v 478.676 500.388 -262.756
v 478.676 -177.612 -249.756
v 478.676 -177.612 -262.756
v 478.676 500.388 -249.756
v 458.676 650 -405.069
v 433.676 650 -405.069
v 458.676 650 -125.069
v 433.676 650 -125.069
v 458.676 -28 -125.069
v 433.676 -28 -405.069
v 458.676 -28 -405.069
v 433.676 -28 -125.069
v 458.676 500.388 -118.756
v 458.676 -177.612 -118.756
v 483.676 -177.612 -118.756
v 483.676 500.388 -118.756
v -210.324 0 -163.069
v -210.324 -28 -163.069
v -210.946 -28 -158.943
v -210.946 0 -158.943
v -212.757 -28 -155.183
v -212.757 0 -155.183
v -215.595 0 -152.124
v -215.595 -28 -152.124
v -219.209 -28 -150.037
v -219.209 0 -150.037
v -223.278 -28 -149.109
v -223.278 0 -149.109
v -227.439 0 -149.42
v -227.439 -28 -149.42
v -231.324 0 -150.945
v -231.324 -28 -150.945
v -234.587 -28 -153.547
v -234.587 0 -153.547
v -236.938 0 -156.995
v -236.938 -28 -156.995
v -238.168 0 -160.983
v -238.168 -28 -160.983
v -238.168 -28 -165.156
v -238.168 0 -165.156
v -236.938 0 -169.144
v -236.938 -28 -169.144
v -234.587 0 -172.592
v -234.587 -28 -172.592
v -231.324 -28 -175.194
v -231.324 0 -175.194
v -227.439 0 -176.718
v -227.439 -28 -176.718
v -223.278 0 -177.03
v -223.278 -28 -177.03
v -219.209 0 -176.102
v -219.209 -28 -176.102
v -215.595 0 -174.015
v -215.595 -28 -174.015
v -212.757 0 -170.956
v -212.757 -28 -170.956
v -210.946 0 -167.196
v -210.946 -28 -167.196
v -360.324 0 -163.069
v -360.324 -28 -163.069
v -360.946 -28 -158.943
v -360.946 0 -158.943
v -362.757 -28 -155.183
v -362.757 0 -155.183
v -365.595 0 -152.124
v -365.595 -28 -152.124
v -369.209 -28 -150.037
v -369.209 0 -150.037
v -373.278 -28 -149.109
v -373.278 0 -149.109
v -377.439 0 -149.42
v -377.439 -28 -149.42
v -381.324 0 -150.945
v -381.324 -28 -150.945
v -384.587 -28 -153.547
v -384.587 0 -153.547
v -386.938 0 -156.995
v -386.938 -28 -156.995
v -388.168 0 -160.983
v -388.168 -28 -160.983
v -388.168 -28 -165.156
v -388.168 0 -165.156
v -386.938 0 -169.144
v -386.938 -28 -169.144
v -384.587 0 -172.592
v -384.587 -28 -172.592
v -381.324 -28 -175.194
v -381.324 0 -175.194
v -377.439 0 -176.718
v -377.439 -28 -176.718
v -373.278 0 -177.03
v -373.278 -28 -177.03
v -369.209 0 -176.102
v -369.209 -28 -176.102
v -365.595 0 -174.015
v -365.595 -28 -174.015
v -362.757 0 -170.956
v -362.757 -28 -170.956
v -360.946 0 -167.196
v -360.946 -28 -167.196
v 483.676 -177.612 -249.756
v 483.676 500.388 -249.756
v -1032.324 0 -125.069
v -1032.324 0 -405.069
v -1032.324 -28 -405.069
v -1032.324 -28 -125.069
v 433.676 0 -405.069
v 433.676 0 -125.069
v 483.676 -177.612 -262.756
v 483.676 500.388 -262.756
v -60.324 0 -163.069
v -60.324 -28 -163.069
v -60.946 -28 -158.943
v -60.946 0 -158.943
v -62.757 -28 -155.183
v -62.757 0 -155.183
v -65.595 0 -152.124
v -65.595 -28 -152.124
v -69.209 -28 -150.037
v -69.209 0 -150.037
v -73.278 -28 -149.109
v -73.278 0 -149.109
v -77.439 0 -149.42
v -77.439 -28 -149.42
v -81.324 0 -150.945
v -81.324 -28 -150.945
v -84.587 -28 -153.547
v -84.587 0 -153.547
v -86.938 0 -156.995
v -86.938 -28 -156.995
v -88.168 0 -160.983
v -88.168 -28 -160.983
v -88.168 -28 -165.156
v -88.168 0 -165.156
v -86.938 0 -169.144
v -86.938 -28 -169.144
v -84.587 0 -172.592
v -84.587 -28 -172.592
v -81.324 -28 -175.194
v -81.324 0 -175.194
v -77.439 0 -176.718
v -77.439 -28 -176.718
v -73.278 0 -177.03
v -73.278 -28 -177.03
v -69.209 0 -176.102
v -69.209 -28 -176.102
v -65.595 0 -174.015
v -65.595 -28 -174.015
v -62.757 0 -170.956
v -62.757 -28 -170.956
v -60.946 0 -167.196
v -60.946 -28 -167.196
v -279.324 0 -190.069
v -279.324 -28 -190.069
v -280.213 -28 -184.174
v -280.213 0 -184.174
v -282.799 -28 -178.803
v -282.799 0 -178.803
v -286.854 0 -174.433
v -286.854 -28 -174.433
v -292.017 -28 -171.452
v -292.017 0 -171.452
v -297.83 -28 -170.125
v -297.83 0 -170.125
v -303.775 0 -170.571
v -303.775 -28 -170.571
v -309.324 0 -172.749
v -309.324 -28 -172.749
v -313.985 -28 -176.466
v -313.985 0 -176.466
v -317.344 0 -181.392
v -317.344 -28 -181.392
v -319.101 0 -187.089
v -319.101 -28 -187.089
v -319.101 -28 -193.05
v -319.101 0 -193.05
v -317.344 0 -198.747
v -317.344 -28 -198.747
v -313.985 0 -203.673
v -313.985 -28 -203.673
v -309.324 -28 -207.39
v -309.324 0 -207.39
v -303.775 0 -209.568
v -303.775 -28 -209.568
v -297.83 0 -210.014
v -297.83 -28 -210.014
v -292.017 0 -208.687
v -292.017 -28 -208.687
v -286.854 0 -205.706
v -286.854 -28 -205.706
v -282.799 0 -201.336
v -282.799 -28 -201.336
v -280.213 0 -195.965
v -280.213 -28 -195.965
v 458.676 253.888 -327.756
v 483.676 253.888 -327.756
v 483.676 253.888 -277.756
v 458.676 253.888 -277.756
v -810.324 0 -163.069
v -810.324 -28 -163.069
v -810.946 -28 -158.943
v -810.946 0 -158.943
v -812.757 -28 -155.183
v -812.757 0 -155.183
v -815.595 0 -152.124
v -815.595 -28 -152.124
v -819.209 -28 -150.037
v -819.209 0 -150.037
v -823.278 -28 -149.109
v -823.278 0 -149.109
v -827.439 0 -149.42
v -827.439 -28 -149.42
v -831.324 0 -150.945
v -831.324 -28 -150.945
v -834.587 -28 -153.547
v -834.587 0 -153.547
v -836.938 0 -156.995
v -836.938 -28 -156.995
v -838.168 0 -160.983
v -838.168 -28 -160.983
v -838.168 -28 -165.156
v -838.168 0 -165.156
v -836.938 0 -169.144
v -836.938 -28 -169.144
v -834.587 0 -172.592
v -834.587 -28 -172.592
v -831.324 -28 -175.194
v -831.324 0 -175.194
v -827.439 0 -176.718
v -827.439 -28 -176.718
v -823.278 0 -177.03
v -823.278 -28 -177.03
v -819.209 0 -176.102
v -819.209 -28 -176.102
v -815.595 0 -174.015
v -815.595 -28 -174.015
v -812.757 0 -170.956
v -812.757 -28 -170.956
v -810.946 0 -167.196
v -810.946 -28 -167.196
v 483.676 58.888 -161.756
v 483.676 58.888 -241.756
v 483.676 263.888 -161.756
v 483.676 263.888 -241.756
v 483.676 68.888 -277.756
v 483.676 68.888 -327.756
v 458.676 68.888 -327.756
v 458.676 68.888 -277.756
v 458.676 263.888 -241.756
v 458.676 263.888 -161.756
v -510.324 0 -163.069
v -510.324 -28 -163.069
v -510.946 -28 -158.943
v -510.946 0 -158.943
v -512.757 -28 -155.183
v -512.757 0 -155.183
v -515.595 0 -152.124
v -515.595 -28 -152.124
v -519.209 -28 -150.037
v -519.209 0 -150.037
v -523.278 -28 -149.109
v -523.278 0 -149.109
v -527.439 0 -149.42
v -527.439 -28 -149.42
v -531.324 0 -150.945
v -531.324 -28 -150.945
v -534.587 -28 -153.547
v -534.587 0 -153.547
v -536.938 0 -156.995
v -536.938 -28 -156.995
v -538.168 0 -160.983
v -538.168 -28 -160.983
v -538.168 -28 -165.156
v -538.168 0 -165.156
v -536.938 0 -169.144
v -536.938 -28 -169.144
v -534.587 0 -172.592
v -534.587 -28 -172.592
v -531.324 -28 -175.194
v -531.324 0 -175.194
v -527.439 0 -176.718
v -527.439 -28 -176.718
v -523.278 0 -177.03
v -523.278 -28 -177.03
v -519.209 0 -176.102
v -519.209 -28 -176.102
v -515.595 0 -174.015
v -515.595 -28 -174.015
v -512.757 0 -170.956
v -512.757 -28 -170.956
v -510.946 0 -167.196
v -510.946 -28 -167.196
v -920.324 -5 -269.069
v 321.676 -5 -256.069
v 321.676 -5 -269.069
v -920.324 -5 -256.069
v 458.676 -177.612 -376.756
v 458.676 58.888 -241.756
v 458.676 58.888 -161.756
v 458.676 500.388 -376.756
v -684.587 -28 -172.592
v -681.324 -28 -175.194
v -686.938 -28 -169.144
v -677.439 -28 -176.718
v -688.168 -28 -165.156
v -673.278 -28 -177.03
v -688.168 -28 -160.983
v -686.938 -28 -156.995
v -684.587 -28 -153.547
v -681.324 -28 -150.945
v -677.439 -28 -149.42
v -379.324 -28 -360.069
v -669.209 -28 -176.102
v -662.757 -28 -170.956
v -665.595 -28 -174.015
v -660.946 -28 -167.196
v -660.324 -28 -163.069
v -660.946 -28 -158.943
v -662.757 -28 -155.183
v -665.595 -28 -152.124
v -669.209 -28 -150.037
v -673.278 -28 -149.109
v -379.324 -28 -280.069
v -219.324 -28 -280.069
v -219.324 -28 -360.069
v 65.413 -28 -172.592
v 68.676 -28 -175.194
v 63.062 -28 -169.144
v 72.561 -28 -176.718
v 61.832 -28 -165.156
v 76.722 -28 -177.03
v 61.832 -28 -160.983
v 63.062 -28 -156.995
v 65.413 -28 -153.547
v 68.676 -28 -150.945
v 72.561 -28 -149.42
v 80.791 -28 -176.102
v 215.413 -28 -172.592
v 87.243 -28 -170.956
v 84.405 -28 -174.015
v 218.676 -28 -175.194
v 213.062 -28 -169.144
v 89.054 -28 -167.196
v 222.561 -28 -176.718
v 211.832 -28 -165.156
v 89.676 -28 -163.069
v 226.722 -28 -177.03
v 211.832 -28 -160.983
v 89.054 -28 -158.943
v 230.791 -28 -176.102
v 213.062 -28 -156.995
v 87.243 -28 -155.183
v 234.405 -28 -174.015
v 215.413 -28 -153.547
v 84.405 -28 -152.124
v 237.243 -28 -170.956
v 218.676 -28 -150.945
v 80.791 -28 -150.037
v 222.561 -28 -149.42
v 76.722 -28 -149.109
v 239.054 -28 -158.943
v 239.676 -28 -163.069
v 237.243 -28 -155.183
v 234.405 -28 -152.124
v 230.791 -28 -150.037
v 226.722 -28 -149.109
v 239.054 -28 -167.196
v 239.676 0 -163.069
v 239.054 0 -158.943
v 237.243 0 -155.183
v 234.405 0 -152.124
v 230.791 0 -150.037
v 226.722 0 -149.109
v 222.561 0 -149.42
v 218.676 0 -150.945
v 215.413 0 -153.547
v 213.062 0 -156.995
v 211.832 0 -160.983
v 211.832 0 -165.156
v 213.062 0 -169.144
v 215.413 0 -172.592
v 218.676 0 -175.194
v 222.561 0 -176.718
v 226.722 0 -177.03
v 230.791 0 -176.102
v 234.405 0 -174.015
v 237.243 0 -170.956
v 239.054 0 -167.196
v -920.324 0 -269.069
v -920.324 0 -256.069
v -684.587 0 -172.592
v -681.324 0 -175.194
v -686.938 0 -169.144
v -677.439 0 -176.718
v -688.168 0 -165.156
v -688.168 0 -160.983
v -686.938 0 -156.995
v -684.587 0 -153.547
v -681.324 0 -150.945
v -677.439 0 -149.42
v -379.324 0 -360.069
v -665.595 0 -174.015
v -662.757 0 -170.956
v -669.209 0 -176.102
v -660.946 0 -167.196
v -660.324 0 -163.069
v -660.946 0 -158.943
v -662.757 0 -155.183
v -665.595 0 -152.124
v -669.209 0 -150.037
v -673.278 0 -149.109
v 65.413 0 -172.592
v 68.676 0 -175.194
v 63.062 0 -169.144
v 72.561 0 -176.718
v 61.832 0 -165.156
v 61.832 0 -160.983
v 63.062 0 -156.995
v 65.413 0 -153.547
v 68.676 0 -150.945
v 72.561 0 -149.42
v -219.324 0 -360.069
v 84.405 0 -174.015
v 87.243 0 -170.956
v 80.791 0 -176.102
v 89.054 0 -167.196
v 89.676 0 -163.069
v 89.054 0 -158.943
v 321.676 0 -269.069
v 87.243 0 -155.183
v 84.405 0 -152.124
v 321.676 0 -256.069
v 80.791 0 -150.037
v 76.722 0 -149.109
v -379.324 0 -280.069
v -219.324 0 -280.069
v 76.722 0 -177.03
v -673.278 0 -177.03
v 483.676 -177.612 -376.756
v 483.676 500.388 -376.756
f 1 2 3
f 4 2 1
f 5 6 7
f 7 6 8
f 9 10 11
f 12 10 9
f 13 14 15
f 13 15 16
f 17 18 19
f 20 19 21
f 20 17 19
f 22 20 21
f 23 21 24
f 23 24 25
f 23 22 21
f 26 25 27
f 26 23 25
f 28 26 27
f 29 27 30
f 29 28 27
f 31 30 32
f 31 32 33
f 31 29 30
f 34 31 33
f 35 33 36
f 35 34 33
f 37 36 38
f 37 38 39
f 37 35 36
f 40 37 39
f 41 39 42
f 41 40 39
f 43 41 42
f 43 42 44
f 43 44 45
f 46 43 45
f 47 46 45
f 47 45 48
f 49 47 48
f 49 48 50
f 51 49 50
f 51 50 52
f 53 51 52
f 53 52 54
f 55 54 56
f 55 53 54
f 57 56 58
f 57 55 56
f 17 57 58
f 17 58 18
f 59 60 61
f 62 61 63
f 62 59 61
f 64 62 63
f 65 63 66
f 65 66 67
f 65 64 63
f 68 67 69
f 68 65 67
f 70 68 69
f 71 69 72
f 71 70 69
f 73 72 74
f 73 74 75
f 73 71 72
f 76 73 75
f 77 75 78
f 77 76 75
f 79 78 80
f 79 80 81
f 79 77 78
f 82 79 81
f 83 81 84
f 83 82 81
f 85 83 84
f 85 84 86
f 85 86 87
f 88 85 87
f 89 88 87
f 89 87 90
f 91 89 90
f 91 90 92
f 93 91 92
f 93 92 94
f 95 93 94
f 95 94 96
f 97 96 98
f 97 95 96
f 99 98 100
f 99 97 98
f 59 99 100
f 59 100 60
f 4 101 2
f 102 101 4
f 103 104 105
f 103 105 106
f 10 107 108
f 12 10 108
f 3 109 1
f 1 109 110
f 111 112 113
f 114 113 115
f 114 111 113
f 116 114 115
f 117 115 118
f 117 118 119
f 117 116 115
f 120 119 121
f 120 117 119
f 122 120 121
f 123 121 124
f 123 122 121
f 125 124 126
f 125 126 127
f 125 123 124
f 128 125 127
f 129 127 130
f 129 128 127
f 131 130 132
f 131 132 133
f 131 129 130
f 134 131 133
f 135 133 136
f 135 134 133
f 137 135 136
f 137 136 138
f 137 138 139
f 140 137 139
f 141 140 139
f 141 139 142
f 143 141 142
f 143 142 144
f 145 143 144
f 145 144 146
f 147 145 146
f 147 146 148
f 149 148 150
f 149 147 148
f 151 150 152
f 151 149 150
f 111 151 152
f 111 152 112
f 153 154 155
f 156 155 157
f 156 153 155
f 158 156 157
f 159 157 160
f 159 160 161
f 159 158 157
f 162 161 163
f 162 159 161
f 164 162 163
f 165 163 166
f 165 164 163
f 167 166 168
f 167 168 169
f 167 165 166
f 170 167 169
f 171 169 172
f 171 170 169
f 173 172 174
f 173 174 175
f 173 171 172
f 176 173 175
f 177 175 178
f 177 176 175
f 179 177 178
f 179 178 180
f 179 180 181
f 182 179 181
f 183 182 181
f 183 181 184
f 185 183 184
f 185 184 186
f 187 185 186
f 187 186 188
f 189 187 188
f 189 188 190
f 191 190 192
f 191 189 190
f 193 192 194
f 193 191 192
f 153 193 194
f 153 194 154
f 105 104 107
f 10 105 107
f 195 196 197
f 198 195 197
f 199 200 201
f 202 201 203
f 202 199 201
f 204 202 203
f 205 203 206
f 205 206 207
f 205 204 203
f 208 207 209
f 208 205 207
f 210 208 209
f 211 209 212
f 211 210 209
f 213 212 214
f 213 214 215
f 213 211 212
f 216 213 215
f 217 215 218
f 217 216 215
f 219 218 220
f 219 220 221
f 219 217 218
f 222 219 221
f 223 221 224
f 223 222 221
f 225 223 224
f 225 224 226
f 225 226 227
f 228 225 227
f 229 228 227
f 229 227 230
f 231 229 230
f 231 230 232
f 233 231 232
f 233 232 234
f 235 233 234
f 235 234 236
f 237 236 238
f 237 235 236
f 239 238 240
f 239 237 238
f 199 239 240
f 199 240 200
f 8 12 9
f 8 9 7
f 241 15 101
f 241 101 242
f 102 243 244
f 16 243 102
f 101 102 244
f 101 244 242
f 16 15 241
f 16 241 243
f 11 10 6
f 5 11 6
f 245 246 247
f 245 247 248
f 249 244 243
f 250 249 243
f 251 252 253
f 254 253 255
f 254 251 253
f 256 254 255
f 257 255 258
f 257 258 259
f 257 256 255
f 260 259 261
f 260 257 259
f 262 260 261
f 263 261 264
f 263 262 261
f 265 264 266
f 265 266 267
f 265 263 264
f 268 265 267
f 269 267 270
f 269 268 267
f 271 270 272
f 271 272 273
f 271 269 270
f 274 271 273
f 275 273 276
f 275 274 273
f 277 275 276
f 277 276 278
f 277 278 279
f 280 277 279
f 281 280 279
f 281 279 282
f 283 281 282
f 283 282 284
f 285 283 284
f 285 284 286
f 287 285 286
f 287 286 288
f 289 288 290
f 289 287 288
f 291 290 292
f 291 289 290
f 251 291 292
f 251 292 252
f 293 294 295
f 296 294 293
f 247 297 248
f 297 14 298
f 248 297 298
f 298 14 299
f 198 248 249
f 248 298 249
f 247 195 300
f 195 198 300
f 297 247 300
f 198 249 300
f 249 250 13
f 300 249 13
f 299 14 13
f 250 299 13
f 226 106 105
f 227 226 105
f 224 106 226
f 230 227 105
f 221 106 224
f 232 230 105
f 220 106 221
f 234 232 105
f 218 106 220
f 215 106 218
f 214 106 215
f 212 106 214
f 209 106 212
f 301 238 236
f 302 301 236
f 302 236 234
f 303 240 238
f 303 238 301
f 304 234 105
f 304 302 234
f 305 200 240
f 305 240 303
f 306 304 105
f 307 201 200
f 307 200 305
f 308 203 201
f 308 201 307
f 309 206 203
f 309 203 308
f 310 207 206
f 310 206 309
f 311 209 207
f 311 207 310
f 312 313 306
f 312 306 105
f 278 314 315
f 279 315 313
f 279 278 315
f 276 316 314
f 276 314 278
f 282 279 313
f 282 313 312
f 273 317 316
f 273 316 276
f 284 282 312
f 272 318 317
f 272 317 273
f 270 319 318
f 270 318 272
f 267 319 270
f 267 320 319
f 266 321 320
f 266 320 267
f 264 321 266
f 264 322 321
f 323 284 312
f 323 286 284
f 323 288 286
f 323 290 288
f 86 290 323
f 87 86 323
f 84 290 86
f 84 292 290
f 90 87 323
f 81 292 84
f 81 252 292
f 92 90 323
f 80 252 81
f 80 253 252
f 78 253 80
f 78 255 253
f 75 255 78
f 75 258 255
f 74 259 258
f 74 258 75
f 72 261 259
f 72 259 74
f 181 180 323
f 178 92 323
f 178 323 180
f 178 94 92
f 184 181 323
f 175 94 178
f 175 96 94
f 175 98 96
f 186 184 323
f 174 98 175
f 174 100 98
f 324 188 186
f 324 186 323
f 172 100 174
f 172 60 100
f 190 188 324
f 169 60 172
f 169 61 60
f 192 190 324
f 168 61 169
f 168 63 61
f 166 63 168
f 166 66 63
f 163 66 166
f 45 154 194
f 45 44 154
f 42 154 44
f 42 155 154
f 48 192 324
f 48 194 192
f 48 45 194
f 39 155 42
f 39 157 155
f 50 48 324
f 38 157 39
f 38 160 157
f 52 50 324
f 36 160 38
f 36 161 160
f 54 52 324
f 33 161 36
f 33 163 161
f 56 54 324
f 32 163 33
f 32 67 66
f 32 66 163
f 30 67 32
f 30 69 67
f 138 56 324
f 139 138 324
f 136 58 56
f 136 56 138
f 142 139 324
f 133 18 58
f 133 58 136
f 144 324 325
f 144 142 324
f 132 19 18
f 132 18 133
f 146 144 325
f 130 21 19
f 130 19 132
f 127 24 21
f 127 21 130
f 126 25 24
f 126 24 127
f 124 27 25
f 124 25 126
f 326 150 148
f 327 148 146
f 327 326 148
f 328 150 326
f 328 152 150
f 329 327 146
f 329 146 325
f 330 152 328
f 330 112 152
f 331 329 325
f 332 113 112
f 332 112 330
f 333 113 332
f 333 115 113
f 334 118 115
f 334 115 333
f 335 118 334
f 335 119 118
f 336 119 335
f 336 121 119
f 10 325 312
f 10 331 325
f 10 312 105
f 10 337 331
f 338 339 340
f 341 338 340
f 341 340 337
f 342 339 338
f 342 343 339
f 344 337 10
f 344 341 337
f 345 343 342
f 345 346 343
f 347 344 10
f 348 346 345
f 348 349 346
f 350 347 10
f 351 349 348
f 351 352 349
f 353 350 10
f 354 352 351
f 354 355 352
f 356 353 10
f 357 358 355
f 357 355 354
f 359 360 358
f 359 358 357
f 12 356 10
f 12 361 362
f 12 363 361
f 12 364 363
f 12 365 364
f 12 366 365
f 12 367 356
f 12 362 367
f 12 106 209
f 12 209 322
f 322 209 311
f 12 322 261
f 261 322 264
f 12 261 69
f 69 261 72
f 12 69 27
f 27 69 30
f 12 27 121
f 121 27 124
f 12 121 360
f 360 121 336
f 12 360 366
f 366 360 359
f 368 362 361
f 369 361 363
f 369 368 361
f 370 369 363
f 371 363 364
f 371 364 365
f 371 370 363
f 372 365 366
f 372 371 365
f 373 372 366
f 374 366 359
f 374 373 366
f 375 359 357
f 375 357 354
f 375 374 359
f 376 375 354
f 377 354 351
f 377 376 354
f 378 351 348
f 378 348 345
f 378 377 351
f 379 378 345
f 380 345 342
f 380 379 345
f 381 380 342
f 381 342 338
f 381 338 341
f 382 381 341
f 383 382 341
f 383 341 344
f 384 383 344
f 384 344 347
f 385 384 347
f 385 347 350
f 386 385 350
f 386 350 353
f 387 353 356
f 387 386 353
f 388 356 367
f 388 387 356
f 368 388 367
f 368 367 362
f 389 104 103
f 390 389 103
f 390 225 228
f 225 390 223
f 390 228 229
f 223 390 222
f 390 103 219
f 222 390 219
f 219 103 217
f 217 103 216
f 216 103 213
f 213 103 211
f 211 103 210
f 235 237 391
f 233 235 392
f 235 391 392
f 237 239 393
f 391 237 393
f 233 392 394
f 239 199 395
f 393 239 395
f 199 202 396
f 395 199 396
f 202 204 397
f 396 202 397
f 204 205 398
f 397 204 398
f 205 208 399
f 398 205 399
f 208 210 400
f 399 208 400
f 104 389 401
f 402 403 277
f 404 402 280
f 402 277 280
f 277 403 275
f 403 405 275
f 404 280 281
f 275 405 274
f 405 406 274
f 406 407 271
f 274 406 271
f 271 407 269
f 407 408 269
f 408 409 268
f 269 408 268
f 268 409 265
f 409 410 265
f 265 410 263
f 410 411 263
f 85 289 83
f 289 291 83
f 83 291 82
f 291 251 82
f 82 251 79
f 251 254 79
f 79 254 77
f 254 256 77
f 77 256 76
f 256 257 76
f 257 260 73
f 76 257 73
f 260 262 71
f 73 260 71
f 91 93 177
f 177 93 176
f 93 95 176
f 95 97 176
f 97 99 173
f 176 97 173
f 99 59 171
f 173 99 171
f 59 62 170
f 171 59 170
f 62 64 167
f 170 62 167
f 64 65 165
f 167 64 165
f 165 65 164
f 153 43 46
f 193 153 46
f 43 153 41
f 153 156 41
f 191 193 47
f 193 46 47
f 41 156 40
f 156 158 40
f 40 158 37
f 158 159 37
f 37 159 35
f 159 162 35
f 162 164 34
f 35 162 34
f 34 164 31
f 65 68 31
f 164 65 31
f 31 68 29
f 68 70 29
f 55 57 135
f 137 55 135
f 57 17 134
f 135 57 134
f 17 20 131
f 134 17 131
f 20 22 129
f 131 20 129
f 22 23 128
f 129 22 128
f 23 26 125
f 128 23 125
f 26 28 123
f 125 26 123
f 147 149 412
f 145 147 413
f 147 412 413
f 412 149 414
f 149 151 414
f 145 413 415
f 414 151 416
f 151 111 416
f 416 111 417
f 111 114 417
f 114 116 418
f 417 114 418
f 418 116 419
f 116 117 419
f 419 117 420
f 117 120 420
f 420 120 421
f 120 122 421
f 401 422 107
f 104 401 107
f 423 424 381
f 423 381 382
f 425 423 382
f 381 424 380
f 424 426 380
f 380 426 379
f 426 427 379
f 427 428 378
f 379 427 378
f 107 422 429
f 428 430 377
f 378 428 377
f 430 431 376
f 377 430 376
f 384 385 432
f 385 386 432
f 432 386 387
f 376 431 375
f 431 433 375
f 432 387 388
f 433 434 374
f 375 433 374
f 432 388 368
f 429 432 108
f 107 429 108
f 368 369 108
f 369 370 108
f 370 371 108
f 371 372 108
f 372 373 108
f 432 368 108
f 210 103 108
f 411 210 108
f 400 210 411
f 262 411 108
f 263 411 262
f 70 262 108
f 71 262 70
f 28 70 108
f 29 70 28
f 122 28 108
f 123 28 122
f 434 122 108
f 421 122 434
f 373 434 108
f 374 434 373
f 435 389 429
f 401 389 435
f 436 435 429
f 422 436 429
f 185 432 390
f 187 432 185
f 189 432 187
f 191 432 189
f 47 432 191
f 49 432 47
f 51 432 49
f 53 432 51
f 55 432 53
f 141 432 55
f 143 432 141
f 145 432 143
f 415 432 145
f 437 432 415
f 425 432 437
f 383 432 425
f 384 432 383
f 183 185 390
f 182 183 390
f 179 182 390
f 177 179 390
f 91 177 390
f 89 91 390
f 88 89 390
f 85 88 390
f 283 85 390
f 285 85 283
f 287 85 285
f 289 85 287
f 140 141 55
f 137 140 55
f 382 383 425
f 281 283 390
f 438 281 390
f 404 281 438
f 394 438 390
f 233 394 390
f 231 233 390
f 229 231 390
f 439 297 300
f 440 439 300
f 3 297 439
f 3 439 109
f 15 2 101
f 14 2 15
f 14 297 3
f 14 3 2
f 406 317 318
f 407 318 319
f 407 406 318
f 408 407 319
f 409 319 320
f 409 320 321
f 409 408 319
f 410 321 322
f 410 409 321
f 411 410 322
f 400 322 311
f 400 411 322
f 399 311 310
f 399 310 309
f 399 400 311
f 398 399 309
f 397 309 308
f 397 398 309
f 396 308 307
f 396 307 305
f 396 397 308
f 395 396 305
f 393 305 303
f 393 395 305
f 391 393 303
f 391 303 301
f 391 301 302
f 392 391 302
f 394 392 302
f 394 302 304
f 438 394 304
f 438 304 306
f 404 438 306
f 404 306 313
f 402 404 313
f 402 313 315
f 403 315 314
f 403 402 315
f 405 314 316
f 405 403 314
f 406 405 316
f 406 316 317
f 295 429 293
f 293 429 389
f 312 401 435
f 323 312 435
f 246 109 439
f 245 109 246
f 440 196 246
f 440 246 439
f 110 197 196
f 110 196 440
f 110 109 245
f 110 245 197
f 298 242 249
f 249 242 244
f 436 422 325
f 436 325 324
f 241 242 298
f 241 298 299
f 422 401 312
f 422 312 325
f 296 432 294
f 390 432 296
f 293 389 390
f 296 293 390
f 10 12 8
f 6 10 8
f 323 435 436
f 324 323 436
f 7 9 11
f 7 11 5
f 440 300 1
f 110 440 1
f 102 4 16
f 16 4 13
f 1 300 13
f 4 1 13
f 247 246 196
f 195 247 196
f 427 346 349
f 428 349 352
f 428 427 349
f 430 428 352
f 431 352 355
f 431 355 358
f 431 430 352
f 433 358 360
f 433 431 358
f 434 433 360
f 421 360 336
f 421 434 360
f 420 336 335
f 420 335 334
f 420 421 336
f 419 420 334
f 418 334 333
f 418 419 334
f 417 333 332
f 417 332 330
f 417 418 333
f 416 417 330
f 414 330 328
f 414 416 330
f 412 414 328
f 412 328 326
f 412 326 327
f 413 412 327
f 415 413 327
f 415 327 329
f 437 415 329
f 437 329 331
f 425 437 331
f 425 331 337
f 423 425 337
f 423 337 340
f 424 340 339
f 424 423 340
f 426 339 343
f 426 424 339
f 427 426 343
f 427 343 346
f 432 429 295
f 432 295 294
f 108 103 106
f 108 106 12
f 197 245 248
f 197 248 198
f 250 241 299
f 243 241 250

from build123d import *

# Parameters (mm, degrees)
F0_W      = 1466
F0_H      = 280
F0_W_2    = 160
F0_H_2    = 80
F0_R      = 14
F0_R_2    = 20
F1_DEPTH  = 28
F2_W      = 678
F2_H      = 280
F3_DEPTH  = 25
F4_W      = 1242
F4_H      = 13
F5_DEPTH  = 5
F6_W      = 678
F6_H      = 258
F7_DEPTH  = 25
F8_W      = 205
F8_H      = 80
F8_W_2    = 185
F8_H_2    = 50
F9_DEPTH  = 25
F10_W     = 678
F10_H     = 13
F11_DEPTH = 5


with BuildPart() as f1:
    # F0 (on Front) → F1 (new body)
    with BuildSketch(Plane.XZ):
        with Locations((-299.3241530657, -265.0694537163)):
            Rectangle(F0_W, F0_H)
        with Locations((-299.3241530657, -320.0694537163)):
            Rectangle(F0_W_2, F0_H_2, mode=Mode.SUBTRACT)
        with Locations((-824.3241530657, -163.0694537163)):
            Circle(F0_R, mode=Mode.SUBTRACT)
        with Locations((-674.3241530657, -163.0694537163)):
            Circle(F0_R, mode=Mode.SUBTRACT)
        with Locations((-524.3241530657, -163.0694537163)):
            Circle(F0_R, mode=Mode.SUBTRACT)
        with Locations((-374.3241530657, -163.0694537163)):
            Circle(F0_R, mode=Mode.SUBTRACT)
        with Locations((-299.3241530657, -190.0694537163)):
            Circle(F0_R_2, mode=Mode.SUBTRACT)
        with Locations((-224.3241530657, -163.0694537163)):
            Circle(F0_R, mode=Mode.SUBTRACT)
        with Locations((-74.3241530657, -163.0694537163)):
            Circle(F0_R, mode=Mode.SUBTRACT)
        with Locations((75.6758469343, -163.0694537163)):
            Circle(F0_R, mode=Mode.SUBTRACT)
        with Locations((225.6758469343, -163.0694537163)):
            Circle(F0_R, mode=Mode.SUBTRACT)
    extrude(amount=F1_DEPTH)

    # F4 (on face) → F5 (cut)
    with BuildSketch(Plane(origin=(0, 0, 0), x_dir=(-1, 0, 0), z_dir=(0, 1, 0))):
        with Locations((299.3241530657, -262.5694537163)):
            Rectangle(F4_W, F4_H)
    extrude(amount=-F5_DEPTH, mode=Mode.SUBTRACT)


with BuildPart() as f3:
    # F2 (on face) → F3 (new body)
    with BuildSketch(Plane.YZ.offset(433.6758469343)):
        with Locations((311, -265.0694537163)):
            Rectangle(F2_W, F2_H)
    extrude(amount=F3_DEPTH)


with BuildPart() as f7:
    # F6 (on face) → F7 (new body)
    with BuildSketch(Plane.YZ.offset(458.6758469343)):
        with Locations((161.3877224861, -247.7558404207)):
            Rectangle(F6_W, F6_H)
    extrude(amount=F7_DEPTH)

    # F8 (on face) → F9 (cut, through all)
    with BuildSketch(Plane.YZ.offset(483.6758469343)):
        with Locations((161.3877224861, -201.7558404207)):
            Rectangle(F8_W, F8_H)
        with Locations((161.3877224861, -302.7558404207)):
            Rectangle(F8_W_2, F8_H_2)
    extrude(amount=-F9_DEPTH, mode=Mode.SUBTRACT)

    # F10 (on face) → F11 (cut)
    with BuildSketch(Plane.YZ.offset(483.6758469343)):
        with Locations((161.3877224861, -256.2558404207)):
            Rectangle(F10_W, F10_H)
    extrude(amount=-F11_DEPTH, mode=Mode.SUBTRACT)


solid = Compound([f1.part, f3.part, f7.part])
